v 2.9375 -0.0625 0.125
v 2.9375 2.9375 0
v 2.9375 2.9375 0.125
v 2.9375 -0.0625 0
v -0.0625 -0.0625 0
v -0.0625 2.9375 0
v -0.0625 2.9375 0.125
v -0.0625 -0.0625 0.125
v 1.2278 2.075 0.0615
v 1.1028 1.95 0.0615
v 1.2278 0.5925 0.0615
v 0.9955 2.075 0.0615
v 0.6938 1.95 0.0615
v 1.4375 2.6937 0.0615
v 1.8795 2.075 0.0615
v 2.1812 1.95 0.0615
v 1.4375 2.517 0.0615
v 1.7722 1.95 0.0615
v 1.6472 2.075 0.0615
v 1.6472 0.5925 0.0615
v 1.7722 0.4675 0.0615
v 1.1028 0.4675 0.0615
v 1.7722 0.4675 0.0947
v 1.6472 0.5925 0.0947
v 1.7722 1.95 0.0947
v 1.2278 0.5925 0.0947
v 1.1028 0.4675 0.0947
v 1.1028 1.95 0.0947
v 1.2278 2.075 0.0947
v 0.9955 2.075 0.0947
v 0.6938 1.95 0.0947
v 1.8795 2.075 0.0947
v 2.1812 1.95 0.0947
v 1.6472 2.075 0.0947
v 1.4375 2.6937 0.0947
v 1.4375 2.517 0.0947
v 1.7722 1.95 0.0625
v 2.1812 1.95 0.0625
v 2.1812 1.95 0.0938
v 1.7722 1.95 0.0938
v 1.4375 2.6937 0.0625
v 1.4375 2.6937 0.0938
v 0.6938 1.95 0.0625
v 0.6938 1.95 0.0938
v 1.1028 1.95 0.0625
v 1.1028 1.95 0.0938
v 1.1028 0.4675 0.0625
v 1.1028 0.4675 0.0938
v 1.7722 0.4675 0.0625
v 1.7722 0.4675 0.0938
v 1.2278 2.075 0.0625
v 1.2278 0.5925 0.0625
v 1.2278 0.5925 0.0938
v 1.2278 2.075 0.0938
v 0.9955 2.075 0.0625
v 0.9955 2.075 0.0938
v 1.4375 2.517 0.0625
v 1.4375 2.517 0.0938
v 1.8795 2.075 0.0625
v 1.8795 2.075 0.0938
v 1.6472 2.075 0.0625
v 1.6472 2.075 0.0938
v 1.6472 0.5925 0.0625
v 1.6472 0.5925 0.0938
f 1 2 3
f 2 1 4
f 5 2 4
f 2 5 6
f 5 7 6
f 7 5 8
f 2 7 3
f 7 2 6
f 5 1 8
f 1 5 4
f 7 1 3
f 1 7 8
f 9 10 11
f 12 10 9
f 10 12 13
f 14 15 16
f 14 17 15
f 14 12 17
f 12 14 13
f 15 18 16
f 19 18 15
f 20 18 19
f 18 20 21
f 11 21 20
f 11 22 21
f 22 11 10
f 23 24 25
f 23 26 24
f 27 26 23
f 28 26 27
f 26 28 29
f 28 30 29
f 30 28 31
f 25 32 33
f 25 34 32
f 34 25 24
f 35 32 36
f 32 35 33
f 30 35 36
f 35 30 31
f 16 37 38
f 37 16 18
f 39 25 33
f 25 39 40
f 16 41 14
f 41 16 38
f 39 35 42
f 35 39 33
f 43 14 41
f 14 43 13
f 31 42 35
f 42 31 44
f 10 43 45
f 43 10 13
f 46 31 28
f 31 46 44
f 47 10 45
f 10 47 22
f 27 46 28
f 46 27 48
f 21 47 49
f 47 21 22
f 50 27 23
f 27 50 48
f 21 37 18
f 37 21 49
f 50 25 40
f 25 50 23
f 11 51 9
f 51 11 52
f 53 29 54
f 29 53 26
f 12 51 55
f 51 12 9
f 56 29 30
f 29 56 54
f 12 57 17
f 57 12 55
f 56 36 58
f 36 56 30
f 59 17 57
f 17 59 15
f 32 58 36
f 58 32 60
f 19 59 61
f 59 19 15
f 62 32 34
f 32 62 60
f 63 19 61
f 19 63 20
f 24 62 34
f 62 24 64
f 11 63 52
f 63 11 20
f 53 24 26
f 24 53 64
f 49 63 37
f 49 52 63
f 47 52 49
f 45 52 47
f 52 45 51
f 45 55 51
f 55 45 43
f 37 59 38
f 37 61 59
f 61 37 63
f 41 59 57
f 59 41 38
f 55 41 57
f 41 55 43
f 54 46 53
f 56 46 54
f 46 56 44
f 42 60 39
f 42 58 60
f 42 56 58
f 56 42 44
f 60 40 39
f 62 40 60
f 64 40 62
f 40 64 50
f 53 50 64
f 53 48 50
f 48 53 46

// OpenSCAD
// file: sub_water_base_plate.scad
// sub_water_base_plate.scad — base plate for the "water" tile family
// (element55 straight, future right-turn/left-turn variants)
// Units: inches
//
// Unlike sub_base_plate.scad's single darkgray plate, this family stacks the
// top pattern_h-plus a bit into three visible layers, bottom to top:
//   darkgray          — 1/2 plate_h  (structural base)
//   background_color  — 1/4 plate_h  (caller-defined)
//   transparent_color — 1/4 plate_h  (caller-defined, spans the outer
//                                      footprint — frame included — so it
//                                      caps the border too)
// Rivets run through darkgray + background_color only (3/4 plate_h) — the
// transparent_color cap sits over them uncut. frame_with_id() is built to
// that same 3/4 plate_h, so its top 1/4 is covered by the transparent cap
// exactly like the inner plate. The arrow (sub_water_arrows.scad) is
// unaffected — it still lives in its own top pattern_h slice, which happens
// to be the same pattern_h as the transparent_color layer at current
// dimensions, but is not derived from it.

plate_w = 2 + 7/8;
plate_d = 2 + 7/8;
plate_h = 1/8; // full plate thickness
frame_w = 1/16;
hole_d  = 3/32;
hole_r  = hole_d / 2;

pattern_h = 1/32;  // thickness of the arrow's top slice (sub_water_arrows.scad) —
                   // independent of the layer fractions below even though it
                   // currently equals plate_h/4.
id_cover = plate_h * 3 / 16;

// ── Layer heights ───────────────────────────────────────────────────────
darkgray_h    = plate_h / 2;
background_h  = plate_h / 4;
transparent_h = plate_h / 4;
frame_h       = plate_h * 3 / 4;               // = darkgray_h + background_h
rivet_depth   = darkgray_h + background_h;     // rivets stop where the transparent cap starts

module rivet_holes() {
    spacing_x = plate_w / 10;
    spacing_y = plate_d / 10;
    inset_x   = spacing_x / 2;
    inset_y   = spacing_y / 2;
    for (i = [0:9]) translate([inset_x + i * spacing_x, inset_y,           -1]) cylinder(h = rivet_depth + 2, r = hole_r, $fn = 20);
    for (i = [0:9]) translate([inset_x + i * spacing_x, plate_d - inset_y, -1]) cylinder(h = rivet_depth + 2, r = hole_r, $fn = 20);
    for (i = [0:9]) translate([inset_x,           inset_y + i * spacing_y, -1]) cylinder(h = rivet_depth + 2, r = hole_r, $fn = 20);
    for (i = [0:9]) translate([plate_w - inset_x, inset_y + i * spacing_y, -1]) cylinder(h = rivet_depth + 2, r = hole_r, $fn = 20);
}

module rivets() {
    spacing_x = plate_w / 10;
    spacing_y = plate_d / 10;
    inset_x   = spacing_x / 2;
    inset_y   = spacing_y / 2;
    color("lightgray") {
        for (i = [0:9]) translate([inset_x + i * spacing_x, inset_y,           0]) cylinder(h = rivet_depth, r = hole_r, $fn = 20);
        for (i = [0:9]) translate([inset_x + i * spacing_x, plate_d - inset_y, 0]) cylinder(h = rivet_depth, r = hole_r, $fn = 20);
        for (i = [0:9]) translate([inset_x,           inset_y + i * spacing_y, 0]) cylinder(h = rivet_depth, r = hole_r, $fn = 20);
        for (i = [0:9]) translate([plate_w - inset_x, inset_y + i * spacing_y, 0]) cylinder(h = rivet_depth, r = hole_r, $fn = 20);
    }
}

// Border + edge ID marks, built to frame_h (3/4 plate_h) — the transparent
// cap covers the remaining top 1/4, over the frame as well as the plate.
module frame_with_id(colors = []) {
    region_w = plate_w / 8;
    region_d = plate_d / 8;
    mark_h   = frame_h - 2 * id_cover;

    color("black")
    difference() {
        translate([-frame_w, -frame_w, 0])
            cube([plate_w + 2 * frame_w, plate_d + 2 * frame_w, frame_h]);
        translate([0, 0, -0.001])
            cube([plate_w, plate_d, frame_h + 0.002]);
        // top/bottom/left/right straight runs only — corners stay solid black
        translate([0, plate_d - 0.001, -0.001])
            cube([plate_w, frame_w + 0.002, frame_h + 0.002]);
        translate([0, -frame_w - 0.001, -0.001])
            cube([plate_w, frame_w + 0.002, frame_h + 0.002]);
        translate([-frame_w - 0.001, 0, -0.001])
            cube([frame_w + 0.002, plate_d, frame_h + 0.002]);
        translate([plate_w - 0.001, 0, -0.001])
            cube([frame_w + 0.002, plate_d, frame_h + 0.002]);
    }

    for (i = [0:7]) {
        c     = (i == 0) ? "darkgray" : (i == 7) ? "black" : ((colors[i-1] != undef) ? colors[i-1] : "black");

        // top edge — id_cover, mark, id_cover
        color("black") translate([i * region_w, plate_d, 0]) cube([region_w, frame_w, id_cover]);
        color(c)       translate([i * region_w, plate_d, id_cover]) cube([region_w, frame_w, mark_h]);
        color("black") translate([i * region_w, plate_d, id_cover + mark_h]) cube([region_w, frame_w, id_cover]);

        // bottom edge (reversed) — id_cover, mark, id_cover
        color("black") translate([(7-i) * region_w, -frame_w, 0]) cube([region_w, frame_w, id_cover]);
        color(c)       translate([(7-i) * region_w, -frame_w, id_cover]) cube([region_w, frame_w, mark_h]);
        color("black") translate([(7-i) * region_w, -frame_w, id_cover + mark_h]) cube([region_w, frame_w, id_cover]);

        // left edge — id_cover, mark, id_cover
        color("black") translate([-frame_w, i * region_d, 0]) cube([frame_w, region_d, id_cover]);
        color(c)       translate([-frame_w, i * region_d, id_cover]) cube([frame_w, region_d, mark_h]);
        color("black") translate([-frame_w, i * region_d, id_cover + mark_h]) cube([frame_w, region_d, id_cover]);

        // right edge (reversed) — id_cover, mark, id_cover
        color("black") translate([plate_w, (7-i) * region_d, 0]) cube([frame_w, region_d, id_cover]);
        color(c)       translate([plate_w, (7-i) * region_d, id_cover]) cube([frame_w, region_d, mark_h]);
        color("black") translate([plate_w, (7-i) * region_d, id_cover + mark_h]) cube([frame_w, region_d, id_cover]);
    }
}

// Frame + inner darkgray/background_color stack, with rivets running
// through both. Does not include the transparent cap — see
// plate_trans_layer().
module plate(colors = []) {
    frame_with_id(colors);
    union() {
        difference() {
            union() {
                color("darkgray")
                    cube([plate_w, plate_d, darkgray_h]);
                translate([0, 0, darkgray_h])
                color(background_color)
                    cube([plate_w, plate_d, background_h]);
            }
            rivet_holes();
        }
        rivets();
    }
}

// plate() plus the transparent_color cap — spans the full outer footprint
// (frame included) across the top transparent_h slice. plate()'s frame and
// inner stack both already stop exactly at plate_h - transparent_h, so this
// is a plain union, not a cut-and-refill.
module plate_trans_layer(colors = []) {
    plate(colors);
    if (show_transparent) {
        color(transparent_color)
        translate([-frame_w, -frame_w, plate_h - transparent_h])
            cube([plate_w + 2 * frame_w, plate_d + 2 * frame_w, transparent_h]);
    }
}   
// main file
// element56.scad — arrow water tile
// Units: inches

straight     = true;
left_turn    = false;
right_turn   = false;
double_speed = false;
show_transparent = true;  // if false, the transparent layer is omitted entirely — useful for
                          // debugging the underlying layers

include <sub_water_base_plate.scad>
include <sub_water_arrows.scad>

plate_colors = [undef, undef, "white", "white", undef, undef];

arrow_color  = "white";
background_color = "blue";
transparent_color = "lightblue";

difference() {
    plate_trans_layer(plate_colors);
    arrow_cutout();
}
arrow();
